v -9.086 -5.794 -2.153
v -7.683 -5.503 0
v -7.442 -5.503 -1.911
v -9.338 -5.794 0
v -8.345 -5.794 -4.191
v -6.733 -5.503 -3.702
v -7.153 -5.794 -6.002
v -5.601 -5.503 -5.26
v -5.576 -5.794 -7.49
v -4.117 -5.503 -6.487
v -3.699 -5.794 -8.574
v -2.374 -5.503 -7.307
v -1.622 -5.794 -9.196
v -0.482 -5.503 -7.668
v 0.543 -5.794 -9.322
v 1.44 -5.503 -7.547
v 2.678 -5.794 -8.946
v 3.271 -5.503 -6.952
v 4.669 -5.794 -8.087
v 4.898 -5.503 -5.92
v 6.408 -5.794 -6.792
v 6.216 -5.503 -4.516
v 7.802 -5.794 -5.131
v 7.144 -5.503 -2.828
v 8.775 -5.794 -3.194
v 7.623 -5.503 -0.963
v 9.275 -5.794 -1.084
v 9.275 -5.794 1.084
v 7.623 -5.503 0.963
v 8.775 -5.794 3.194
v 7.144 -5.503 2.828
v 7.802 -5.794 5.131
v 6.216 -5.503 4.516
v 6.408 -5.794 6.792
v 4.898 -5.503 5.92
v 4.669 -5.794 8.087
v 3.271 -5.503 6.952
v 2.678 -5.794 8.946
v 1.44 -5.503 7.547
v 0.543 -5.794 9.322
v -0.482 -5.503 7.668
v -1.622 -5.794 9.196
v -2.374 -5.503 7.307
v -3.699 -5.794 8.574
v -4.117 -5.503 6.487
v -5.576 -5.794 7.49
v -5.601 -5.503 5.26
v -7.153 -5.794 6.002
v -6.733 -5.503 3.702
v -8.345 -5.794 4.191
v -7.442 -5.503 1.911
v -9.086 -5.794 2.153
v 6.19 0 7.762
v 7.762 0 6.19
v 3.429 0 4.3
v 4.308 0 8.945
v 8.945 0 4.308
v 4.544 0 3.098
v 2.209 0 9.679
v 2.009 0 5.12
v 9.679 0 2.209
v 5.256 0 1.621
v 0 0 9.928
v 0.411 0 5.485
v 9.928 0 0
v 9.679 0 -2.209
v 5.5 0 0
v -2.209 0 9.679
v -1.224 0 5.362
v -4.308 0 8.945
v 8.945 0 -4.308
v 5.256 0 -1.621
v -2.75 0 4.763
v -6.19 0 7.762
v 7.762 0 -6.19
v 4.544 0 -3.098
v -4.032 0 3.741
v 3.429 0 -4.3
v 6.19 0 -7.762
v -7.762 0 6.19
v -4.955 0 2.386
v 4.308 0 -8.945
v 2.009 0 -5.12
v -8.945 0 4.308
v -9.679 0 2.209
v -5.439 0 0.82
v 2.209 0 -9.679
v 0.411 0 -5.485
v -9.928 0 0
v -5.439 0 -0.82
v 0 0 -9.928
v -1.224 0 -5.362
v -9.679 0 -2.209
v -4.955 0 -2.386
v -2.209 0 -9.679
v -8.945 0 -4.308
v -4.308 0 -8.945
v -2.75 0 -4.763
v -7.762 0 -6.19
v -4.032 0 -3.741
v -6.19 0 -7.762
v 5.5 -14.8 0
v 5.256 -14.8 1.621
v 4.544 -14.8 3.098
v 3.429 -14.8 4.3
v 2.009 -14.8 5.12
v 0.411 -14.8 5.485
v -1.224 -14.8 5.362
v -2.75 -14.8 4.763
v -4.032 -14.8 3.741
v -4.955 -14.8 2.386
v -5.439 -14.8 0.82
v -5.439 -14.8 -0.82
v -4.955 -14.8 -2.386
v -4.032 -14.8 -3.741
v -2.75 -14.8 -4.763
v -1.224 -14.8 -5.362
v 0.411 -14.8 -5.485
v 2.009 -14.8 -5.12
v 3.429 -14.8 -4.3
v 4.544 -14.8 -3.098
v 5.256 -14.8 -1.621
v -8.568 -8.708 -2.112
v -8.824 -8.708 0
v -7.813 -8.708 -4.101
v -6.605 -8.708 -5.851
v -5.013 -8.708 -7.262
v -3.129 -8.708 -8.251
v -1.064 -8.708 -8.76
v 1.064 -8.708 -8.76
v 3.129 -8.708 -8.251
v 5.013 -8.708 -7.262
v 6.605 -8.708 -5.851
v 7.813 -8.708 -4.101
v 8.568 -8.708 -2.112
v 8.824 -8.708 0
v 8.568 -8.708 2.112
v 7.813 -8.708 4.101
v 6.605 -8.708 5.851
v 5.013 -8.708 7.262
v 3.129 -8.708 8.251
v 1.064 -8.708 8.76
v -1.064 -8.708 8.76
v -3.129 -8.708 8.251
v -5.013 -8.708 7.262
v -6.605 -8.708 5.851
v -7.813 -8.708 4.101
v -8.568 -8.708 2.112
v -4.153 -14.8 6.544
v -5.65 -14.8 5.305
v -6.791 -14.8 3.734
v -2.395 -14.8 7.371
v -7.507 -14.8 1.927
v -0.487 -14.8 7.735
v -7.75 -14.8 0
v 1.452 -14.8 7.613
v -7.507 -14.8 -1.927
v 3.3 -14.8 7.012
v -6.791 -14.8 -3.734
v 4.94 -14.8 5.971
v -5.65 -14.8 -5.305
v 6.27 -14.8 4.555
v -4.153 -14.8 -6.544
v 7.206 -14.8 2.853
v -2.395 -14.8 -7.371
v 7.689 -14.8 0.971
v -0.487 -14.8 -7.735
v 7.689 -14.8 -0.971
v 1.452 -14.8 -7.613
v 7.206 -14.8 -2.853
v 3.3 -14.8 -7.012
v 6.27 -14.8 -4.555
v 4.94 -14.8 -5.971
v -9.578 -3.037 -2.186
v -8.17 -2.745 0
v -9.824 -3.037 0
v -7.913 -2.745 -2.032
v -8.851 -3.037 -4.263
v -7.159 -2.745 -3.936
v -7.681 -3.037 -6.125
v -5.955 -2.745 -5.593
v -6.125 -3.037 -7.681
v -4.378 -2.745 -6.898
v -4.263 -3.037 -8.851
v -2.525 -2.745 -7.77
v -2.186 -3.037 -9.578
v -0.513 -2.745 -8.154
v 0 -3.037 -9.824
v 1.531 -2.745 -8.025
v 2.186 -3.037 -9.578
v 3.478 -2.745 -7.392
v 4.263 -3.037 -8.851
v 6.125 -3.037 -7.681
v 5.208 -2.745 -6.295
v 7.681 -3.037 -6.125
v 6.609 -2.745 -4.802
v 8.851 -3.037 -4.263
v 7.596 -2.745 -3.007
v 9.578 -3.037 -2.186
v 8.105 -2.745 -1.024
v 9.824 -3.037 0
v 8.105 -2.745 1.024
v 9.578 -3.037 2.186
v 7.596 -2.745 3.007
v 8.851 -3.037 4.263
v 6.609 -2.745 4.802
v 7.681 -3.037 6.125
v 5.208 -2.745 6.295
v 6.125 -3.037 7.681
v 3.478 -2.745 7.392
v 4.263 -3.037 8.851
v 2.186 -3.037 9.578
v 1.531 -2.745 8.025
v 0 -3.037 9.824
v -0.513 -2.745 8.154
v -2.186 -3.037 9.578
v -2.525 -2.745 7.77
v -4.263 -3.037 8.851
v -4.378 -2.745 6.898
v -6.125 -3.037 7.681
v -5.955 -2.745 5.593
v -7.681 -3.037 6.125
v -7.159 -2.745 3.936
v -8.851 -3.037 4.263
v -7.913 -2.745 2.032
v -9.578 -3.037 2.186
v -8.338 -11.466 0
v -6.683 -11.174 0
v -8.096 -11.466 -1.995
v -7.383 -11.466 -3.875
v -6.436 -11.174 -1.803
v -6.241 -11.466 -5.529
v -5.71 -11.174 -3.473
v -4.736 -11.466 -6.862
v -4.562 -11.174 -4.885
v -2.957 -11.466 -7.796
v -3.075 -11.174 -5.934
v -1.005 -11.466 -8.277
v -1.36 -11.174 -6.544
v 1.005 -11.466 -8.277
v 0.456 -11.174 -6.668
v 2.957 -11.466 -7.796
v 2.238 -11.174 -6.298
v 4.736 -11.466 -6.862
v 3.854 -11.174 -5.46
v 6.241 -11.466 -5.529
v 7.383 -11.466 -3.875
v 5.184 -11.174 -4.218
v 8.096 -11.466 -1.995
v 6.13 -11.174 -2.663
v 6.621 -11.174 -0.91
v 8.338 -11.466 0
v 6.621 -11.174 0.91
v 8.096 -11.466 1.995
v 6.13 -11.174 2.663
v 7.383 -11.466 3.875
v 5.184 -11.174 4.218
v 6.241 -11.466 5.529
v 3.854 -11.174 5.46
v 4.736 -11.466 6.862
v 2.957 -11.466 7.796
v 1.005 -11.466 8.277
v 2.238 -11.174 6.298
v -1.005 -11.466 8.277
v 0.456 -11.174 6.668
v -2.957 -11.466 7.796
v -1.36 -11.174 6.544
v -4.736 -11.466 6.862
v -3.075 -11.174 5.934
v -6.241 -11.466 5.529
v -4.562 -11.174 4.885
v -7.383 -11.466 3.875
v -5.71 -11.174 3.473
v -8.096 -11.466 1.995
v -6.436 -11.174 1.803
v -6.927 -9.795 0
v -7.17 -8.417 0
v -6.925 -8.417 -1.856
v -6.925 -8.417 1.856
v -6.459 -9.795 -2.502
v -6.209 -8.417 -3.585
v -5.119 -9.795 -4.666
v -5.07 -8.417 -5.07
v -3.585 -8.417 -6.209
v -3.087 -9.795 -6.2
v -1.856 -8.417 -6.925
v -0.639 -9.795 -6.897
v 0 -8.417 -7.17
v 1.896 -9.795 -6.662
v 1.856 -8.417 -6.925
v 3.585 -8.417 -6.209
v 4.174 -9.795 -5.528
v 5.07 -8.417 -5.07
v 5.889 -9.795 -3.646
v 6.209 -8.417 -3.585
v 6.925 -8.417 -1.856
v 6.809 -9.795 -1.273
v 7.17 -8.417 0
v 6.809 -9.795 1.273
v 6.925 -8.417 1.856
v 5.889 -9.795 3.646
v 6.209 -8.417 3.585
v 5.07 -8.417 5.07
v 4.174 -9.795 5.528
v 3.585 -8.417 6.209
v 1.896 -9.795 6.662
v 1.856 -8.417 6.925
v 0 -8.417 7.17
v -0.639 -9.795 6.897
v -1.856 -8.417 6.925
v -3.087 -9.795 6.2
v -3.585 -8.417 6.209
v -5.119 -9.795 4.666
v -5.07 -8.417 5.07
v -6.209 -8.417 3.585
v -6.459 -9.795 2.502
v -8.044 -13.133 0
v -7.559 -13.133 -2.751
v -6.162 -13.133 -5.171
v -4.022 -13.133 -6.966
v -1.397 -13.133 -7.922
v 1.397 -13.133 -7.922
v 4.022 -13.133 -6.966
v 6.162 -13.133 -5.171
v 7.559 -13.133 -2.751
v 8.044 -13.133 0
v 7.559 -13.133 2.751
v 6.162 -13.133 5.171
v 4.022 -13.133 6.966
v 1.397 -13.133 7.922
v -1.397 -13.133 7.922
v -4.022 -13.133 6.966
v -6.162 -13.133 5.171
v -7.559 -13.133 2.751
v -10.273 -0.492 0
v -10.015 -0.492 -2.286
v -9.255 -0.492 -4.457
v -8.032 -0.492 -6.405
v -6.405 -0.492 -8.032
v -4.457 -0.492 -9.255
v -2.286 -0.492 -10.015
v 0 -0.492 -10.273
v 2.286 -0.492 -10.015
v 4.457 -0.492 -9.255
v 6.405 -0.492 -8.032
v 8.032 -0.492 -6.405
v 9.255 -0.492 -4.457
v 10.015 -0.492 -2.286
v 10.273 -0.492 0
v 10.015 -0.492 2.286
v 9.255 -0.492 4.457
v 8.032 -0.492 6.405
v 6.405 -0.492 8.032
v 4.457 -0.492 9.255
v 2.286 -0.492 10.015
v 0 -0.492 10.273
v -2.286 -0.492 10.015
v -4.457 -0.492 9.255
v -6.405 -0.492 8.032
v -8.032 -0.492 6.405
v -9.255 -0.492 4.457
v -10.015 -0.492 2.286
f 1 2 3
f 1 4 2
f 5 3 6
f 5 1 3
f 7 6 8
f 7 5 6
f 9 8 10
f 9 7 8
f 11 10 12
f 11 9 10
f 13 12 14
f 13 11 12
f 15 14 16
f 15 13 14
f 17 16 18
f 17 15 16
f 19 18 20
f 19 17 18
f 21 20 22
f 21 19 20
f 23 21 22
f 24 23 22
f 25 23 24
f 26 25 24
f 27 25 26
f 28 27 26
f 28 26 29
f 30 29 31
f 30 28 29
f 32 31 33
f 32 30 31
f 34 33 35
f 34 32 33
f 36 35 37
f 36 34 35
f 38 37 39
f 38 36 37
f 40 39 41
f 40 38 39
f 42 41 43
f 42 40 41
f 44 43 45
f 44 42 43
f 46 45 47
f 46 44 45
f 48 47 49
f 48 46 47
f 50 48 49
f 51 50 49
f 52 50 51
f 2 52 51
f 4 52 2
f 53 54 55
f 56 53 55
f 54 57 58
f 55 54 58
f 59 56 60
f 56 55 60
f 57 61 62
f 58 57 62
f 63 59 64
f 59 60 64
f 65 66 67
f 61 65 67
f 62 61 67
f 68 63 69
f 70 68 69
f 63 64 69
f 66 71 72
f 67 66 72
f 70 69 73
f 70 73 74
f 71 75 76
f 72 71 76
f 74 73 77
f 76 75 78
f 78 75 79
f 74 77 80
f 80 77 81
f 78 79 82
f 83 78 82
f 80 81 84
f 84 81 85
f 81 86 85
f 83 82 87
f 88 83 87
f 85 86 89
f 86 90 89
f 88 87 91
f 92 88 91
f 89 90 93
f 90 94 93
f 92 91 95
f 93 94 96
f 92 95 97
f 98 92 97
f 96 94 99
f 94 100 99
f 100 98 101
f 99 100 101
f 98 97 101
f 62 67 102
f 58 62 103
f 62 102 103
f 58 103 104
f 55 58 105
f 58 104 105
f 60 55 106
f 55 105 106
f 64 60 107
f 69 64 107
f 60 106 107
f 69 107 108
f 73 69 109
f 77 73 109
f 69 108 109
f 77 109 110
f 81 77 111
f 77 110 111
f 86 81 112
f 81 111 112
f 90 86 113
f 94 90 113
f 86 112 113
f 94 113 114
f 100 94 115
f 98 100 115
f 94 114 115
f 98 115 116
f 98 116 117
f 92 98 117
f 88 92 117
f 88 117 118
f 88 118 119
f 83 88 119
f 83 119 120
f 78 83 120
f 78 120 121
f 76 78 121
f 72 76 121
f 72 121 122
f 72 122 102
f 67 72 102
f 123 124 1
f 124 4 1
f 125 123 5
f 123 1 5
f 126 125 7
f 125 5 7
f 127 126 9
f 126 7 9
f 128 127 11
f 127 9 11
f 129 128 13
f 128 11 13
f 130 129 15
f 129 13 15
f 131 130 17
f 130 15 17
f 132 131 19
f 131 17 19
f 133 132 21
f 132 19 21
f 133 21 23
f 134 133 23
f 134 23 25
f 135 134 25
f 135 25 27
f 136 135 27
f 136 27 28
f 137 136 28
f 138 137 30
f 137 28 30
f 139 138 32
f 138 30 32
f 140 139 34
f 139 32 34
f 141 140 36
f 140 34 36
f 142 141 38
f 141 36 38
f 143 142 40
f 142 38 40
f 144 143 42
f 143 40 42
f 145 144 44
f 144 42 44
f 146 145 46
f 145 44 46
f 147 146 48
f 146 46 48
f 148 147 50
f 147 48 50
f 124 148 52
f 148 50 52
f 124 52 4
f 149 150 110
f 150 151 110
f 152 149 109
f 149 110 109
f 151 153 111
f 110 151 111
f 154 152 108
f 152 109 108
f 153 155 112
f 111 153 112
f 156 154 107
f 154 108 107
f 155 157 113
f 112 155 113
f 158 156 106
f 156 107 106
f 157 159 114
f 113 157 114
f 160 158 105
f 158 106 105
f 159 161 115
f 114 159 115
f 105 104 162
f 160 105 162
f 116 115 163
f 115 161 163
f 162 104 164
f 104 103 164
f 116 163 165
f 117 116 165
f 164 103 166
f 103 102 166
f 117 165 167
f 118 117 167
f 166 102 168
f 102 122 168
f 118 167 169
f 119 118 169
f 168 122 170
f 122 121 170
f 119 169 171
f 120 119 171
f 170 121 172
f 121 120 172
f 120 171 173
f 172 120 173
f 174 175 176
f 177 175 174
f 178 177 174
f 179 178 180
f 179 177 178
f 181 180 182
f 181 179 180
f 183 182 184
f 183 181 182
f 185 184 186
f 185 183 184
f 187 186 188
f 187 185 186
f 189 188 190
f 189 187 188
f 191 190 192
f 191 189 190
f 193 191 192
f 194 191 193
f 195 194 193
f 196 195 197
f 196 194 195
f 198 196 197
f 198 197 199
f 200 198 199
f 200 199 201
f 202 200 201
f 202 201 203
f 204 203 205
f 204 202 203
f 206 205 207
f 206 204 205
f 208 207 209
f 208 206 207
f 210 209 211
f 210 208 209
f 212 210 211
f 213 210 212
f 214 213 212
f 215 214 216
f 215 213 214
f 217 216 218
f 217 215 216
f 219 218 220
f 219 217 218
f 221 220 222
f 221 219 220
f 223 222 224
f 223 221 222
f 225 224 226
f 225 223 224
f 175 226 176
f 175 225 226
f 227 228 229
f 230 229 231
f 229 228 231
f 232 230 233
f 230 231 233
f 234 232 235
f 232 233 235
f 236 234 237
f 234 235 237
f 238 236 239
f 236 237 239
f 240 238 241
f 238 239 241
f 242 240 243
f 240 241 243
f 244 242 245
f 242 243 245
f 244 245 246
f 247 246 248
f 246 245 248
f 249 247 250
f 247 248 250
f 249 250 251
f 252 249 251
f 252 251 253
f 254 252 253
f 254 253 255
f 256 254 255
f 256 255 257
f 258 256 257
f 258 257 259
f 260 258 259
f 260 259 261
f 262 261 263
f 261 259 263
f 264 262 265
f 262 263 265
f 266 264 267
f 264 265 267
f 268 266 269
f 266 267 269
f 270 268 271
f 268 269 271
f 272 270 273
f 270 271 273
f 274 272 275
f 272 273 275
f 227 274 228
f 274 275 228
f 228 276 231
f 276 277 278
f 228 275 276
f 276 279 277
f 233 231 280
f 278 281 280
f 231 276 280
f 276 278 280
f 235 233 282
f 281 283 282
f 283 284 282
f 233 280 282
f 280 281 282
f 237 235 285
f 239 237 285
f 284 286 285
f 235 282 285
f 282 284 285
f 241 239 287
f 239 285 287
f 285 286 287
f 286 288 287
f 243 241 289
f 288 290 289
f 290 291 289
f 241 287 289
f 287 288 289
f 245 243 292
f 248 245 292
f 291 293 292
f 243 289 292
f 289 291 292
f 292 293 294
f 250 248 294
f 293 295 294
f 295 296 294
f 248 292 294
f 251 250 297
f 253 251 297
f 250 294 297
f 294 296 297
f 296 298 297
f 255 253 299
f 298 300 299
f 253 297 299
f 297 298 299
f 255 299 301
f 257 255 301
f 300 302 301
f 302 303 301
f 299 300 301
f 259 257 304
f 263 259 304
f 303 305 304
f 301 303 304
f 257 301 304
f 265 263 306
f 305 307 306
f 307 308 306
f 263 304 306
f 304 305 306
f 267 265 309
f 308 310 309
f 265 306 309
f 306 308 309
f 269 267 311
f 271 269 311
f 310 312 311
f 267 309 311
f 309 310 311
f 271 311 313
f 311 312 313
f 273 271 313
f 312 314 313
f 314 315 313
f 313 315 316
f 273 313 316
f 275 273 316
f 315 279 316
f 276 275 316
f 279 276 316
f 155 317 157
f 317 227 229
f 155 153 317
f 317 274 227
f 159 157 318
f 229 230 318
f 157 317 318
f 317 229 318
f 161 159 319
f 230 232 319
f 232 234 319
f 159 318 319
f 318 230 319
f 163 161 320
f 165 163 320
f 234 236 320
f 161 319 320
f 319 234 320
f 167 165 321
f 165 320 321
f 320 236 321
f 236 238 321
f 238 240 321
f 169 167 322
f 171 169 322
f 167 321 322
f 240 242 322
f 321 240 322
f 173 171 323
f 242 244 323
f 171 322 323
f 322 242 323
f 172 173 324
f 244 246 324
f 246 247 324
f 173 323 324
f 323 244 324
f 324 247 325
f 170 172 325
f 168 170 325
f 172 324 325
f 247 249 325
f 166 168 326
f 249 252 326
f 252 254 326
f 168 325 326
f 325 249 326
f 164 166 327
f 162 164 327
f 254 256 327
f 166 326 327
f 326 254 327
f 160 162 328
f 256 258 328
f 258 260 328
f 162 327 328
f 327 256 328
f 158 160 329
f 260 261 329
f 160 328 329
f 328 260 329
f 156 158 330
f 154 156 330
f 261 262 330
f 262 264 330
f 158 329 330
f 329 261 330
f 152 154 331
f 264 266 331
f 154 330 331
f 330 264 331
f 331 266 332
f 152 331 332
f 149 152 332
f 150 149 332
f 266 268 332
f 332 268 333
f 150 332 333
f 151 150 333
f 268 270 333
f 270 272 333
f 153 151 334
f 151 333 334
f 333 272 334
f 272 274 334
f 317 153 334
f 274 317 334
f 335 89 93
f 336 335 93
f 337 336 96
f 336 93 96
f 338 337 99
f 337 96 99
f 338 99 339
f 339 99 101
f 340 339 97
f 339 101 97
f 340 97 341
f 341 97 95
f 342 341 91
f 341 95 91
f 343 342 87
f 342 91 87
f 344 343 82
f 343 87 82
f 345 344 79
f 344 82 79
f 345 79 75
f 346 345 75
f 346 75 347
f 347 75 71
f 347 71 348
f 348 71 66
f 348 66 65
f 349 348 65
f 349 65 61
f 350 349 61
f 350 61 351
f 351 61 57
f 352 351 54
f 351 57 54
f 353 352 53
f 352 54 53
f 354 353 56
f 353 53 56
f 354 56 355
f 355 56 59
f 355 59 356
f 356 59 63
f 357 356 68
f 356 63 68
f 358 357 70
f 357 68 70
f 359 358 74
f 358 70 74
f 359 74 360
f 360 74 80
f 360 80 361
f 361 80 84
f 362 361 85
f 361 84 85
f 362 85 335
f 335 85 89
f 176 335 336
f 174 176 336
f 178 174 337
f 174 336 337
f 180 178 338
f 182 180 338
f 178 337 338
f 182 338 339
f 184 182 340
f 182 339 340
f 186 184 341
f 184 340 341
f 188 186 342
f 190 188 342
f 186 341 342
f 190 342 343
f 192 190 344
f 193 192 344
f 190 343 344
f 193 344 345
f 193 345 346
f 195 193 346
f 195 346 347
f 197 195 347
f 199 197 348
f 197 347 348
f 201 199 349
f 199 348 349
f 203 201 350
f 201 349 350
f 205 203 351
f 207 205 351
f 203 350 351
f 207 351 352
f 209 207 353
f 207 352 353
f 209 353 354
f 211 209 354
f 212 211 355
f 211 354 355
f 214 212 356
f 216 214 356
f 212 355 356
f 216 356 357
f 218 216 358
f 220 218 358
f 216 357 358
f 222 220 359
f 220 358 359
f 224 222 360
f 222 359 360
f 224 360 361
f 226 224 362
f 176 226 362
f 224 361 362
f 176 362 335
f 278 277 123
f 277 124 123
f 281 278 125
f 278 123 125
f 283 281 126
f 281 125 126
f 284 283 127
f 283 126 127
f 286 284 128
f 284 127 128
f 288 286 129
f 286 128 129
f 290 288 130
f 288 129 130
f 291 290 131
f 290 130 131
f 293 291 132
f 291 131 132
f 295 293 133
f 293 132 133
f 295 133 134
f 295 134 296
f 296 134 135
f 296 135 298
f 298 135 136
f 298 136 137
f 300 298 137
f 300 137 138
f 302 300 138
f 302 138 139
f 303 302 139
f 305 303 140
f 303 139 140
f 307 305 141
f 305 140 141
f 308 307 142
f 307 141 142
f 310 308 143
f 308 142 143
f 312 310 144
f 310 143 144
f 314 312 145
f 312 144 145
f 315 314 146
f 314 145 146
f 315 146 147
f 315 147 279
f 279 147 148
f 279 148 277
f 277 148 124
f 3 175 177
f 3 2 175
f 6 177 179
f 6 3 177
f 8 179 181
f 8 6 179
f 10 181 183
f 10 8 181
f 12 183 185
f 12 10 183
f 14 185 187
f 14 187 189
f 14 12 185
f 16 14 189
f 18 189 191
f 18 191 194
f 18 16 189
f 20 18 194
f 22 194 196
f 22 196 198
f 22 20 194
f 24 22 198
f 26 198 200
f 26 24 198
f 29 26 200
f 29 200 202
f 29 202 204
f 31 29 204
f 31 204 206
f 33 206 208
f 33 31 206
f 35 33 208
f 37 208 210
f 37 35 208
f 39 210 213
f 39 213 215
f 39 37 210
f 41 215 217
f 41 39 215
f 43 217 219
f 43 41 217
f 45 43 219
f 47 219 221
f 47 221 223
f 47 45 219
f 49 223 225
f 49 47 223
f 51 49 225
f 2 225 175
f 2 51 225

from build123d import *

# Parameters (mm, degrees)
SMUSSO2_SIZE             = 0.5
SMUSSO2_SIZE2            = 0.431608995
SCHIZZO6_R               = 5.5
TAGLIO_ESTRUSIONE1_DEPTH = 21.738887755


with BuildPart() as part:
    # Schizzo1 → Rivoluzione1 (revolve)
    with BuildSketch(Plane.XY):
        Polygon((0, -14.8), (-7.75, -14.8), (-10.359639314, 0), (0, 0), align=None)
    revolve(axis=Axis((0, 0, 0), (0, -1, 0)))

    # Schizzo2 → Taglia-Rivoluzione1 (revolve, cut)
    with BuildSketch(Plane.XY):
        Polygon((-9.824143265, -3.03694901), (-8.16966624, -2.745220072), (-7.683451342, -5.50268178), (-9.337928368, -5.794410718), align=None)
        Polygon((-8.824143265, -8.70823083), (-8.337928368, -11.465692538), (-6.683451342, -11.1739636), (-7.16966624, -8.416501891), align=None)
    revolve(axis=Axis((0, 0, 0), (0, -1, 0)), mode=Mode.SUBTRACT)

    # Smusso2
    smusso2_edges = [part.edges().sort_by_distance(p)[0] for p in [
        (10.359639314, 0, 0),
    ]]
    smusso2_side = [part.faces().sort_by_distance(p)[0] for p in [
        (10.09189129, -1.518474505, 0),
    ]]
    chamfer(smusso2_edges, length=SMUSSO2_SIZE, length2=SMUSSO2_SIZE2, reference=smusso2_side[0])

    # Schizzo6 → Taglio-Estrusione1 (cut, through all)
    with BuildSketch(Plane.XZ.offset(14.8)):
        Circle(SCHIZZO6_R)
    extrude(amount=-TAGLIO_ESTRUSIONE1_DEPTH, mode=Mode.SUBTRACT)


solid = part.part
